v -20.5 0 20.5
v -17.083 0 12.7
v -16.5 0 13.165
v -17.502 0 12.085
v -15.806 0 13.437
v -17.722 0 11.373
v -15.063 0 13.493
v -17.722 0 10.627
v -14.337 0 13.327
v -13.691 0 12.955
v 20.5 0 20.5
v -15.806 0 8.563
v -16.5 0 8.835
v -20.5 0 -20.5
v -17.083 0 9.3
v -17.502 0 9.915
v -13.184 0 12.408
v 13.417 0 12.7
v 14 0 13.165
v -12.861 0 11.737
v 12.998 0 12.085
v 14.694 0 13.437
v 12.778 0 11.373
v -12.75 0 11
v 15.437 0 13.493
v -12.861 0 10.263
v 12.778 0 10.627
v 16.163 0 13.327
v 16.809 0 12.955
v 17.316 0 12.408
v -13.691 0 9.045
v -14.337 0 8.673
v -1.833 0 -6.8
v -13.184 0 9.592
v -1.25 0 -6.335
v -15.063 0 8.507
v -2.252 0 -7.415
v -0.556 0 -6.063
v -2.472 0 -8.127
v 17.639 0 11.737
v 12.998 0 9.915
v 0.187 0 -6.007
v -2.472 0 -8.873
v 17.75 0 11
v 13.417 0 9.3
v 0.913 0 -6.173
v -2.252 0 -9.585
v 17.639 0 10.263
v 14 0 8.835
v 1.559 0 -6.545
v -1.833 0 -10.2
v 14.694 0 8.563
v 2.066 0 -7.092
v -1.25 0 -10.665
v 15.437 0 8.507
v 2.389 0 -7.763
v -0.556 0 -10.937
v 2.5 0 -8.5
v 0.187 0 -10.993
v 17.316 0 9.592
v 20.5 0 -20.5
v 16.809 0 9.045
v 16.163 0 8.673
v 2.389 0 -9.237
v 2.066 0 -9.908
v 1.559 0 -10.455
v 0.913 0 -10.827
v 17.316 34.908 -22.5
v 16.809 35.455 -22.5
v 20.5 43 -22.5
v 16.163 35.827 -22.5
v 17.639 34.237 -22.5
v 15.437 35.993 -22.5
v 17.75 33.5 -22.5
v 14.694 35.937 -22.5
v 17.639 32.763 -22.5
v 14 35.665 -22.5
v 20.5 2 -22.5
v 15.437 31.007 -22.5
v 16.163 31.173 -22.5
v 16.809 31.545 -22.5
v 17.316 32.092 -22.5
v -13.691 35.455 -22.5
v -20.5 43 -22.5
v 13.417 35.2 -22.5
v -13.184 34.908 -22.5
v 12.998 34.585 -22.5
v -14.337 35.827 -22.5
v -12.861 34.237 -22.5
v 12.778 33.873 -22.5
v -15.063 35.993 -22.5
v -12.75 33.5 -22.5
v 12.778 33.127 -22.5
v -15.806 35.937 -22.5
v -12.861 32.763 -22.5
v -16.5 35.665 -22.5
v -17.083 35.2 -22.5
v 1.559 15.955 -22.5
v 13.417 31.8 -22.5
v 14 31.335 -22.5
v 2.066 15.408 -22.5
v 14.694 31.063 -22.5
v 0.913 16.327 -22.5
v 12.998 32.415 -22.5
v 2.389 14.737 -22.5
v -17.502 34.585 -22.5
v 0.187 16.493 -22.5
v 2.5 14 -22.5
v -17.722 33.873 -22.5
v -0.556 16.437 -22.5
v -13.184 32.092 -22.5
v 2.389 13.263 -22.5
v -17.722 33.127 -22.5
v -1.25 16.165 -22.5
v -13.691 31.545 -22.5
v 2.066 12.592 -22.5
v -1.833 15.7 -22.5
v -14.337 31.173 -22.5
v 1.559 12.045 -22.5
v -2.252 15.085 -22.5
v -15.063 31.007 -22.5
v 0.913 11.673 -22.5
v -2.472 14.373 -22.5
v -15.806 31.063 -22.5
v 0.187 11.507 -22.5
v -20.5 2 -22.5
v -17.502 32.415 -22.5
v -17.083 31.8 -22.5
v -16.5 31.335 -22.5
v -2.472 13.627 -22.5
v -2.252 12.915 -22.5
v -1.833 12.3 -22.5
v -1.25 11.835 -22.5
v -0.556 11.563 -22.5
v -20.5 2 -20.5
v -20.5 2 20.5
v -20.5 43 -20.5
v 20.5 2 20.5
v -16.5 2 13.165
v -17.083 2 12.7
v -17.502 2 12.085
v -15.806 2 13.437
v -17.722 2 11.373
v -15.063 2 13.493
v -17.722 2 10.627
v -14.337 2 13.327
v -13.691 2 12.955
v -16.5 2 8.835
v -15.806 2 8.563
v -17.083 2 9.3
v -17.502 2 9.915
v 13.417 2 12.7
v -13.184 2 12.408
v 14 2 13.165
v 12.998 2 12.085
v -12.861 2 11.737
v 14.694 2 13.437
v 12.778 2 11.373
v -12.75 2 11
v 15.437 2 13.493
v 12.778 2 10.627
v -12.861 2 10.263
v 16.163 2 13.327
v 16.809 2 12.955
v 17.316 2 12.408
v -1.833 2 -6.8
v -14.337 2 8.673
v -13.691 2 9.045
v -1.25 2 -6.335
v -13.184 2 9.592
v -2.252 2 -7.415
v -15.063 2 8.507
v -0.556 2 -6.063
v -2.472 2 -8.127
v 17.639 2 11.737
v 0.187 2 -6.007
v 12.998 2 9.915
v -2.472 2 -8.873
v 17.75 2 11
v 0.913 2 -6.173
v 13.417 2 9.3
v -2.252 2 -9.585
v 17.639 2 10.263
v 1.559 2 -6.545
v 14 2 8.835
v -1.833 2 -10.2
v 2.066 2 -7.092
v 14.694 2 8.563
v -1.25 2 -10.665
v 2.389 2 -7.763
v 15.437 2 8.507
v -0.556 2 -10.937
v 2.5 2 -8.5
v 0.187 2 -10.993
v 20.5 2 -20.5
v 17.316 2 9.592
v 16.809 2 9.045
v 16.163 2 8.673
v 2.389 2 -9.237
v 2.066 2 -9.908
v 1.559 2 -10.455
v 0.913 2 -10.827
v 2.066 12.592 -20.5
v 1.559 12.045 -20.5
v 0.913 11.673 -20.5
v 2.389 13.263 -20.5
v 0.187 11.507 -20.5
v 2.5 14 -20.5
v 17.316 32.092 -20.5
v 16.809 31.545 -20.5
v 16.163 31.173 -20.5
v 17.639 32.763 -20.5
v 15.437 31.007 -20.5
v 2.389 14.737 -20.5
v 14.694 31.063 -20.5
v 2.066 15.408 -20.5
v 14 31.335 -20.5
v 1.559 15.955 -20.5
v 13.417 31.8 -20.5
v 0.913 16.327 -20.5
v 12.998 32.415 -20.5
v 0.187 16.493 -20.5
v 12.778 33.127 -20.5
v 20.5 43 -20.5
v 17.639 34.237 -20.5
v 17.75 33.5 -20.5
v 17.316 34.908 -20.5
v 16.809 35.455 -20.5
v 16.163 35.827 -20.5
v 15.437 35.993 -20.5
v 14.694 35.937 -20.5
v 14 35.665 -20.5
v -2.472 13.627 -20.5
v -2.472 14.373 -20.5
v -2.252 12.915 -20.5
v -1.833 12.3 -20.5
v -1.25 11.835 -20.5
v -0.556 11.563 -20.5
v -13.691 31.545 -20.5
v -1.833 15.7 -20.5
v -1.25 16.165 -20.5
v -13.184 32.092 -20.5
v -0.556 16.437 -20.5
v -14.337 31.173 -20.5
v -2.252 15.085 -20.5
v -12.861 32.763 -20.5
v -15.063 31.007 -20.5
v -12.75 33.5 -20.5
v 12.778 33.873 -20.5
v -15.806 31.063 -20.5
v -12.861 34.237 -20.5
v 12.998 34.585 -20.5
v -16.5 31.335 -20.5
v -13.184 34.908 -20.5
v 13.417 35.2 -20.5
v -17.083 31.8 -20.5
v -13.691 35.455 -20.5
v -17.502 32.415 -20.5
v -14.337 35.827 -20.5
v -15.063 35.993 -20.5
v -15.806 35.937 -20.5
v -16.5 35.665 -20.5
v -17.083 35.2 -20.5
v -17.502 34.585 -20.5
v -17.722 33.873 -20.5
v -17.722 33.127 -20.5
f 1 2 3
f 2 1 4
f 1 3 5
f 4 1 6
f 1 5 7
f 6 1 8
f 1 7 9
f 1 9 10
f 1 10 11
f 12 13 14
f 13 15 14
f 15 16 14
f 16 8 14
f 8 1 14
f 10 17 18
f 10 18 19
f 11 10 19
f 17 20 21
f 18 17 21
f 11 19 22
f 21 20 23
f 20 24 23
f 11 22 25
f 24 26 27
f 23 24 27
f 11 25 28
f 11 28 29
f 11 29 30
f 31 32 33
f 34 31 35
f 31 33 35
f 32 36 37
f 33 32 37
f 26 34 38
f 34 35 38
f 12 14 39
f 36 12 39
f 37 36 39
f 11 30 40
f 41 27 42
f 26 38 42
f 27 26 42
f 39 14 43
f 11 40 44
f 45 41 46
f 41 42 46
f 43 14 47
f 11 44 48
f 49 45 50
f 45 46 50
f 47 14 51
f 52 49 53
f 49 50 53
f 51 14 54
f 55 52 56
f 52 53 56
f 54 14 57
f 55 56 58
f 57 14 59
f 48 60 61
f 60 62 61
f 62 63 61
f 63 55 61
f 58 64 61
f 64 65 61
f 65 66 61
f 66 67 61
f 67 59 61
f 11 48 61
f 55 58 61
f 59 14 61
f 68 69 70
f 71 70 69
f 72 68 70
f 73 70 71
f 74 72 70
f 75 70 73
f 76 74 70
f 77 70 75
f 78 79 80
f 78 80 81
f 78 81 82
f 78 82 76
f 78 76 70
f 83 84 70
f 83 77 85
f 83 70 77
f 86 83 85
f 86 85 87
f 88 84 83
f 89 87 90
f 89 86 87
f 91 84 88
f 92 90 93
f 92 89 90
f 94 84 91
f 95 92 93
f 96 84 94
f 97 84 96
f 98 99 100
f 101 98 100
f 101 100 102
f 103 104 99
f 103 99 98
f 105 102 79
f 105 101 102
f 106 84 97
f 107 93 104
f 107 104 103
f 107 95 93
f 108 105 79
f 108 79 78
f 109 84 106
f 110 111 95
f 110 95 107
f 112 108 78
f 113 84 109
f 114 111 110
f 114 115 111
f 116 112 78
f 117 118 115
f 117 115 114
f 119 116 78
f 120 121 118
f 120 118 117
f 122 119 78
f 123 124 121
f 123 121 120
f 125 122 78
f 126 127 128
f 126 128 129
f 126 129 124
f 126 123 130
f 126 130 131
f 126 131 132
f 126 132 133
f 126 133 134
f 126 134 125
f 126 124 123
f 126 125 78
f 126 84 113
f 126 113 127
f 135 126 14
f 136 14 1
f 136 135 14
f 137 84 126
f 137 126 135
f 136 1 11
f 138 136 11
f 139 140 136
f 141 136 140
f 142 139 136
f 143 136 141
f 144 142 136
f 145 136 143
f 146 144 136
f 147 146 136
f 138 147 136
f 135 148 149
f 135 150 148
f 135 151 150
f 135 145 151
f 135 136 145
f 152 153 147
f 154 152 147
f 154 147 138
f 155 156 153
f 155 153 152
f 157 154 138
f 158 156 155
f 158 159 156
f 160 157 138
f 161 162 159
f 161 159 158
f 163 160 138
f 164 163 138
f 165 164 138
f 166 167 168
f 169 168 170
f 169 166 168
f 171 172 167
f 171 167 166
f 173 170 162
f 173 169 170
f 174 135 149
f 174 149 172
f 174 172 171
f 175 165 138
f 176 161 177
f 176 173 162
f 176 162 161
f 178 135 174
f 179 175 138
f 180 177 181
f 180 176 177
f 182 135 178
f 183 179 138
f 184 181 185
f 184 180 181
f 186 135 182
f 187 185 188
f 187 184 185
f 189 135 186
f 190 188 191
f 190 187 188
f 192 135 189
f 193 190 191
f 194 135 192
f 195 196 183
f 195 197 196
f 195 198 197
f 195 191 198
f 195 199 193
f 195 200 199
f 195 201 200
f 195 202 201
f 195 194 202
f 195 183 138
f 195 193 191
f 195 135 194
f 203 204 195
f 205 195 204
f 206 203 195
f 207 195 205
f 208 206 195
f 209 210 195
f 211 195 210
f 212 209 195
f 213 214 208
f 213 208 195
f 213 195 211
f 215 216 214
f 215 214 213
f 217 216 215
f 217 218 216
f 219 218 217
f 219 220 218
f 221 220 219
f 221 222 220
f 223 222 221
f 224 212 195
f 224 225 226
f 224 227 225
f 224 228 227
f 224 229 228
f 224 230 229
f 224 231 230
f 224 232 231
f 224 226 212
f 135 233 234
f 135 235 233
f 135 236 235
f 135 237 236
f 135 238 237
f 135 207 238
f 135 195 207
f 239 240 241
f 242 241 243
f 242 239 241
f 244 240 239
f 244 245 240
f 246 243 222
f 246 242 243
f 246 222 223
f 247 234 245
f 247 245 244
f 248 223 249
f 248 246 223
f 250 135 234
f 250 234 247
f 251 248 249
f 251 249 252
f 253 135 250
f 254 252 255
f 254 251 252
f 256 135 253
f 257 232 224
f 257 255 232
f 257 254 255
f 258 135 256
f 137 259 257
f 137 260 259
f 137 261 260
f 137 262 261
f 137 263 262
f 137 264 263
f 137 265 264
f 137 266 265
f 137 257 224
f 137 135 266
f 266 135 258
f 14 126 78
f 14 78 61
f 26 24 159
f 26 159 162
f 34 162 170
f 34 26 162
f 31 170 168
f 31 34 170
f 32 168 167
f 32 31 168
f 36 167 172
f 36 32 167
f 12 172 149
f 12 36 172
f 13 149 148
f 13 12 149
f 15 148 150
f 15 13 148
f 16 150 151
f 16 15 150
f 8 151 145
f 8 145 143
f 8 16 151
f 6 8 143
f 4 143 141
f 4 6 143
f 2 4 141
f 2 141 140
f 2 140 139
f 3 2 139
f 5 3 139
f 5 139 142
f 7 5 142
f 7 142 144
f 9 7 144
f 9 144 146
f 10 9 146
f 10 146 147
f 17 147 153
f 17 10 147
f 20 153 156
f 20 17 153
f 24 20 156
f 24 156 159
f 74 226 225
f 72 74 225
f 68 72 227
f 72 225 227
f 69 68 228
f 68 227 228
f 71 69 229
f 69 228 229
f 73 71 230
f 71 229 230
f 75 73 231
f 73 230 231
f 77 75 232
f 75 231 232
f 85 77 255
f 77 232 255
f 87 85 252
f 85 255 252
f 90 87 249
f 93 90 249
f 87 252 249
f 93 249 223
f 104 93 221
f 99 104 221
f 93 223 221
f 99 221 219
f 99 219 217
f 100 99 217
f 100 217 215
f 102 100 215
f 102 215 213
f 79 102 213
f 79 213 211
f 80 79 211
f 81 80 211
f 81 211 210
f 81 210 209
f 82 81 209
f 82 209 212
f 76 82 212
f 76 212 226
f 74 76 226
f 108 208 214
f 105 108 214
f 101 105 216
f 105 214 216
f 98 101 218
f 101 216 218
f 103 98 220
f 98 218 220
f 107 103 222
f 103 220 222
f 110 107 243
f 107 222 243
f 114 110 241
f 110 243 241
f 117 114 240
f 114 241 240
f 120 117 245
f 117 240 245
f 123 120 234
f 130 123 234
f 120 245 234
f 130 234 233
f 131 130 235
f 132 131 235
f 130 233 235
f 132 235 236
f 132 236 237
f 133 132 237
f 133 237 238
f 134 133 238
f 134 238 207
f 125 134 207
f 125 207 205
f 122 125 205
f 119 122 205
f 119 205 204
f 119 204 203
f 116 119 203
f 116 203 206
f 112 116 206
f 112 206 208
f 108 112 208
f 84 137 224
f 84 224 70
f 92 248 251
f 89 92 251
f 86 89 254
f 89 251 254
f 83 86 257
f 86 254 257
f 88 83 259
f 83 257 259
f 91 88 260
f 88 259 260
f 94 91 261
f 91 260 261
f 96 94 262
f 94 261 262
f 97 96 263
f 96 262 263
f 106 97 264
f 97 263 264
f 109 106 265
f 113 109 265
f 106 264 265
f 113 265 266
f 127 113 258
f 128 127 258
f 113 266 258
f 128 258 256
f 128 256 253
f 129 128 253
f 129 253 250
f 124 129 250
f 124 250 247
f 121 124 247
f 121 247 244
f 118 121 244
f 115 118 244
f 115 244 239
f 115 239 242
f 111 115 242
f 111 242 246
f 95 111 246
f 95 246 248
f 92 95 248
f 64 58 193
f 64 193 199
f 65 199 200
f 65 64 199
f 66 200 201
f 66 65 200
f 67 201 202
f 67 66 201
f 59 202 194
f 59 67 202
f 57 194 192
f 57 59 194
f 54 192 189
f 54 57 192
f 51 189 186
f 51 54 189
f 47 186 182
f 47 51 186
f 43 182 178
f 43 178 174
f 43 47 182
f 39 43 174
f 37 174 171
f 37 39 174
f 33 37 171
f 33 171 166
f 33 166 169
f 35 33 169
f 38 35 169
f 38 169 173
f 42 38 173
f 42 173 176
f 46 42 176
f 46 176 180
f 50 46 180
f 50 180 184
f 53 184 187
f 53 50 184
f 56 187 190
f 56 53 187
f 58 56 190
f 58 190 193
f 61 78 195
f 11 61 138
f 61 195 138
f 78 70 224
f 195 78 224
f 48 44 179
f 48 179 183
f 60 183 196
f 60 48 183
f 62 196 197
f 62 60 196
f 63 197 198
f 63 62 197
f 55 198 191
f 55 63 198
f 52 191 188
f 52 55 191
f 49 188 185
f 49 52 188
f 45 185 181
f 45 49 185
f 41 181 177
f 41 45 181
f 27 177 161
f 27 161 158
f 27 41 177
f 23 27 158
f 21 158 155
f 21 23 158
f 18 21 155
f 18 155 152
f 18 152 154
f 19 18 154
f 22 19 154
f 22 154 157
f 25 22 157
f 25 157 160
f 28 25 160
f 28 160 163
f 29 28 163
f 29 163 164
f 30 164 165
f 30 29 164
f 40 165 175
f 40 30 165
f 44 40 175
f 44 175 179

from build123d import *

# Parameters (mm, degrees)
SKETCH_1_W          = 41
SKETCH_1_H          = 41
SKETCH_1_R          = 2.5
EXTRUDE_1_DEPTH     = 2
EXTRUDE_2_DEPTH     = 41
SKETCH_3_R          = 2.5
CUT_EXTRUDE_1_DEPTH = 3


with BuildPart() as part:
    # 草图1 → 凸台-拉伸1 (new body)
    with BuildSketch(Plane(origin=(0, 0, 0), x_dir=(1, 0, 0), z_dir=(0, 1, 0))):
        Rectangle(SKETCH_1_W, SKETCH_1_H)
        with Locations((-15.25, -11)):
            Circle(SKETCH_1_R, mode=Mode.SUBTRACT)
        with Locations((15.25, -11)):
            Circle(SKETCH_1_R, mode=Mode.SUBTRACT)
        with Locations((0, 8.5)):
            Circle(SKETCH_1_R, mode=Mode.SUBTRACT)
    extrude(amount=EXTRUDE_1_DEPTH)

    # 草图2 → 凸台-拉伸2 (add)
    with BuildSketch(Plane.ZY.offset(20.5)):
        Polygon((-22.5, 2), (-20.5, 0), (-20.5, 2), (-20.5, 43), (-22.5, 43), align=None)
    extrude(amount=-EXTRUDE_2_DEPTH)

    # 草图3 → 切除-拉伸1 (cut, through all)
    with BuildSketch(Plane.XY.offset(-20.5)):
        with Locations((-15.25, 33.5)):
            Circle(SKETCH_3_R)
        with Locations((15.25, 33.5)):
            Circle(SKETCH_3_R)
        with Locations((0, 14)):
            Circle(SKETCH_3_R)
    extrude(amount=-CUT_EXTRUDE_1_DEPTH, mode=Mode.SUBTRACT)


solid = part.part
